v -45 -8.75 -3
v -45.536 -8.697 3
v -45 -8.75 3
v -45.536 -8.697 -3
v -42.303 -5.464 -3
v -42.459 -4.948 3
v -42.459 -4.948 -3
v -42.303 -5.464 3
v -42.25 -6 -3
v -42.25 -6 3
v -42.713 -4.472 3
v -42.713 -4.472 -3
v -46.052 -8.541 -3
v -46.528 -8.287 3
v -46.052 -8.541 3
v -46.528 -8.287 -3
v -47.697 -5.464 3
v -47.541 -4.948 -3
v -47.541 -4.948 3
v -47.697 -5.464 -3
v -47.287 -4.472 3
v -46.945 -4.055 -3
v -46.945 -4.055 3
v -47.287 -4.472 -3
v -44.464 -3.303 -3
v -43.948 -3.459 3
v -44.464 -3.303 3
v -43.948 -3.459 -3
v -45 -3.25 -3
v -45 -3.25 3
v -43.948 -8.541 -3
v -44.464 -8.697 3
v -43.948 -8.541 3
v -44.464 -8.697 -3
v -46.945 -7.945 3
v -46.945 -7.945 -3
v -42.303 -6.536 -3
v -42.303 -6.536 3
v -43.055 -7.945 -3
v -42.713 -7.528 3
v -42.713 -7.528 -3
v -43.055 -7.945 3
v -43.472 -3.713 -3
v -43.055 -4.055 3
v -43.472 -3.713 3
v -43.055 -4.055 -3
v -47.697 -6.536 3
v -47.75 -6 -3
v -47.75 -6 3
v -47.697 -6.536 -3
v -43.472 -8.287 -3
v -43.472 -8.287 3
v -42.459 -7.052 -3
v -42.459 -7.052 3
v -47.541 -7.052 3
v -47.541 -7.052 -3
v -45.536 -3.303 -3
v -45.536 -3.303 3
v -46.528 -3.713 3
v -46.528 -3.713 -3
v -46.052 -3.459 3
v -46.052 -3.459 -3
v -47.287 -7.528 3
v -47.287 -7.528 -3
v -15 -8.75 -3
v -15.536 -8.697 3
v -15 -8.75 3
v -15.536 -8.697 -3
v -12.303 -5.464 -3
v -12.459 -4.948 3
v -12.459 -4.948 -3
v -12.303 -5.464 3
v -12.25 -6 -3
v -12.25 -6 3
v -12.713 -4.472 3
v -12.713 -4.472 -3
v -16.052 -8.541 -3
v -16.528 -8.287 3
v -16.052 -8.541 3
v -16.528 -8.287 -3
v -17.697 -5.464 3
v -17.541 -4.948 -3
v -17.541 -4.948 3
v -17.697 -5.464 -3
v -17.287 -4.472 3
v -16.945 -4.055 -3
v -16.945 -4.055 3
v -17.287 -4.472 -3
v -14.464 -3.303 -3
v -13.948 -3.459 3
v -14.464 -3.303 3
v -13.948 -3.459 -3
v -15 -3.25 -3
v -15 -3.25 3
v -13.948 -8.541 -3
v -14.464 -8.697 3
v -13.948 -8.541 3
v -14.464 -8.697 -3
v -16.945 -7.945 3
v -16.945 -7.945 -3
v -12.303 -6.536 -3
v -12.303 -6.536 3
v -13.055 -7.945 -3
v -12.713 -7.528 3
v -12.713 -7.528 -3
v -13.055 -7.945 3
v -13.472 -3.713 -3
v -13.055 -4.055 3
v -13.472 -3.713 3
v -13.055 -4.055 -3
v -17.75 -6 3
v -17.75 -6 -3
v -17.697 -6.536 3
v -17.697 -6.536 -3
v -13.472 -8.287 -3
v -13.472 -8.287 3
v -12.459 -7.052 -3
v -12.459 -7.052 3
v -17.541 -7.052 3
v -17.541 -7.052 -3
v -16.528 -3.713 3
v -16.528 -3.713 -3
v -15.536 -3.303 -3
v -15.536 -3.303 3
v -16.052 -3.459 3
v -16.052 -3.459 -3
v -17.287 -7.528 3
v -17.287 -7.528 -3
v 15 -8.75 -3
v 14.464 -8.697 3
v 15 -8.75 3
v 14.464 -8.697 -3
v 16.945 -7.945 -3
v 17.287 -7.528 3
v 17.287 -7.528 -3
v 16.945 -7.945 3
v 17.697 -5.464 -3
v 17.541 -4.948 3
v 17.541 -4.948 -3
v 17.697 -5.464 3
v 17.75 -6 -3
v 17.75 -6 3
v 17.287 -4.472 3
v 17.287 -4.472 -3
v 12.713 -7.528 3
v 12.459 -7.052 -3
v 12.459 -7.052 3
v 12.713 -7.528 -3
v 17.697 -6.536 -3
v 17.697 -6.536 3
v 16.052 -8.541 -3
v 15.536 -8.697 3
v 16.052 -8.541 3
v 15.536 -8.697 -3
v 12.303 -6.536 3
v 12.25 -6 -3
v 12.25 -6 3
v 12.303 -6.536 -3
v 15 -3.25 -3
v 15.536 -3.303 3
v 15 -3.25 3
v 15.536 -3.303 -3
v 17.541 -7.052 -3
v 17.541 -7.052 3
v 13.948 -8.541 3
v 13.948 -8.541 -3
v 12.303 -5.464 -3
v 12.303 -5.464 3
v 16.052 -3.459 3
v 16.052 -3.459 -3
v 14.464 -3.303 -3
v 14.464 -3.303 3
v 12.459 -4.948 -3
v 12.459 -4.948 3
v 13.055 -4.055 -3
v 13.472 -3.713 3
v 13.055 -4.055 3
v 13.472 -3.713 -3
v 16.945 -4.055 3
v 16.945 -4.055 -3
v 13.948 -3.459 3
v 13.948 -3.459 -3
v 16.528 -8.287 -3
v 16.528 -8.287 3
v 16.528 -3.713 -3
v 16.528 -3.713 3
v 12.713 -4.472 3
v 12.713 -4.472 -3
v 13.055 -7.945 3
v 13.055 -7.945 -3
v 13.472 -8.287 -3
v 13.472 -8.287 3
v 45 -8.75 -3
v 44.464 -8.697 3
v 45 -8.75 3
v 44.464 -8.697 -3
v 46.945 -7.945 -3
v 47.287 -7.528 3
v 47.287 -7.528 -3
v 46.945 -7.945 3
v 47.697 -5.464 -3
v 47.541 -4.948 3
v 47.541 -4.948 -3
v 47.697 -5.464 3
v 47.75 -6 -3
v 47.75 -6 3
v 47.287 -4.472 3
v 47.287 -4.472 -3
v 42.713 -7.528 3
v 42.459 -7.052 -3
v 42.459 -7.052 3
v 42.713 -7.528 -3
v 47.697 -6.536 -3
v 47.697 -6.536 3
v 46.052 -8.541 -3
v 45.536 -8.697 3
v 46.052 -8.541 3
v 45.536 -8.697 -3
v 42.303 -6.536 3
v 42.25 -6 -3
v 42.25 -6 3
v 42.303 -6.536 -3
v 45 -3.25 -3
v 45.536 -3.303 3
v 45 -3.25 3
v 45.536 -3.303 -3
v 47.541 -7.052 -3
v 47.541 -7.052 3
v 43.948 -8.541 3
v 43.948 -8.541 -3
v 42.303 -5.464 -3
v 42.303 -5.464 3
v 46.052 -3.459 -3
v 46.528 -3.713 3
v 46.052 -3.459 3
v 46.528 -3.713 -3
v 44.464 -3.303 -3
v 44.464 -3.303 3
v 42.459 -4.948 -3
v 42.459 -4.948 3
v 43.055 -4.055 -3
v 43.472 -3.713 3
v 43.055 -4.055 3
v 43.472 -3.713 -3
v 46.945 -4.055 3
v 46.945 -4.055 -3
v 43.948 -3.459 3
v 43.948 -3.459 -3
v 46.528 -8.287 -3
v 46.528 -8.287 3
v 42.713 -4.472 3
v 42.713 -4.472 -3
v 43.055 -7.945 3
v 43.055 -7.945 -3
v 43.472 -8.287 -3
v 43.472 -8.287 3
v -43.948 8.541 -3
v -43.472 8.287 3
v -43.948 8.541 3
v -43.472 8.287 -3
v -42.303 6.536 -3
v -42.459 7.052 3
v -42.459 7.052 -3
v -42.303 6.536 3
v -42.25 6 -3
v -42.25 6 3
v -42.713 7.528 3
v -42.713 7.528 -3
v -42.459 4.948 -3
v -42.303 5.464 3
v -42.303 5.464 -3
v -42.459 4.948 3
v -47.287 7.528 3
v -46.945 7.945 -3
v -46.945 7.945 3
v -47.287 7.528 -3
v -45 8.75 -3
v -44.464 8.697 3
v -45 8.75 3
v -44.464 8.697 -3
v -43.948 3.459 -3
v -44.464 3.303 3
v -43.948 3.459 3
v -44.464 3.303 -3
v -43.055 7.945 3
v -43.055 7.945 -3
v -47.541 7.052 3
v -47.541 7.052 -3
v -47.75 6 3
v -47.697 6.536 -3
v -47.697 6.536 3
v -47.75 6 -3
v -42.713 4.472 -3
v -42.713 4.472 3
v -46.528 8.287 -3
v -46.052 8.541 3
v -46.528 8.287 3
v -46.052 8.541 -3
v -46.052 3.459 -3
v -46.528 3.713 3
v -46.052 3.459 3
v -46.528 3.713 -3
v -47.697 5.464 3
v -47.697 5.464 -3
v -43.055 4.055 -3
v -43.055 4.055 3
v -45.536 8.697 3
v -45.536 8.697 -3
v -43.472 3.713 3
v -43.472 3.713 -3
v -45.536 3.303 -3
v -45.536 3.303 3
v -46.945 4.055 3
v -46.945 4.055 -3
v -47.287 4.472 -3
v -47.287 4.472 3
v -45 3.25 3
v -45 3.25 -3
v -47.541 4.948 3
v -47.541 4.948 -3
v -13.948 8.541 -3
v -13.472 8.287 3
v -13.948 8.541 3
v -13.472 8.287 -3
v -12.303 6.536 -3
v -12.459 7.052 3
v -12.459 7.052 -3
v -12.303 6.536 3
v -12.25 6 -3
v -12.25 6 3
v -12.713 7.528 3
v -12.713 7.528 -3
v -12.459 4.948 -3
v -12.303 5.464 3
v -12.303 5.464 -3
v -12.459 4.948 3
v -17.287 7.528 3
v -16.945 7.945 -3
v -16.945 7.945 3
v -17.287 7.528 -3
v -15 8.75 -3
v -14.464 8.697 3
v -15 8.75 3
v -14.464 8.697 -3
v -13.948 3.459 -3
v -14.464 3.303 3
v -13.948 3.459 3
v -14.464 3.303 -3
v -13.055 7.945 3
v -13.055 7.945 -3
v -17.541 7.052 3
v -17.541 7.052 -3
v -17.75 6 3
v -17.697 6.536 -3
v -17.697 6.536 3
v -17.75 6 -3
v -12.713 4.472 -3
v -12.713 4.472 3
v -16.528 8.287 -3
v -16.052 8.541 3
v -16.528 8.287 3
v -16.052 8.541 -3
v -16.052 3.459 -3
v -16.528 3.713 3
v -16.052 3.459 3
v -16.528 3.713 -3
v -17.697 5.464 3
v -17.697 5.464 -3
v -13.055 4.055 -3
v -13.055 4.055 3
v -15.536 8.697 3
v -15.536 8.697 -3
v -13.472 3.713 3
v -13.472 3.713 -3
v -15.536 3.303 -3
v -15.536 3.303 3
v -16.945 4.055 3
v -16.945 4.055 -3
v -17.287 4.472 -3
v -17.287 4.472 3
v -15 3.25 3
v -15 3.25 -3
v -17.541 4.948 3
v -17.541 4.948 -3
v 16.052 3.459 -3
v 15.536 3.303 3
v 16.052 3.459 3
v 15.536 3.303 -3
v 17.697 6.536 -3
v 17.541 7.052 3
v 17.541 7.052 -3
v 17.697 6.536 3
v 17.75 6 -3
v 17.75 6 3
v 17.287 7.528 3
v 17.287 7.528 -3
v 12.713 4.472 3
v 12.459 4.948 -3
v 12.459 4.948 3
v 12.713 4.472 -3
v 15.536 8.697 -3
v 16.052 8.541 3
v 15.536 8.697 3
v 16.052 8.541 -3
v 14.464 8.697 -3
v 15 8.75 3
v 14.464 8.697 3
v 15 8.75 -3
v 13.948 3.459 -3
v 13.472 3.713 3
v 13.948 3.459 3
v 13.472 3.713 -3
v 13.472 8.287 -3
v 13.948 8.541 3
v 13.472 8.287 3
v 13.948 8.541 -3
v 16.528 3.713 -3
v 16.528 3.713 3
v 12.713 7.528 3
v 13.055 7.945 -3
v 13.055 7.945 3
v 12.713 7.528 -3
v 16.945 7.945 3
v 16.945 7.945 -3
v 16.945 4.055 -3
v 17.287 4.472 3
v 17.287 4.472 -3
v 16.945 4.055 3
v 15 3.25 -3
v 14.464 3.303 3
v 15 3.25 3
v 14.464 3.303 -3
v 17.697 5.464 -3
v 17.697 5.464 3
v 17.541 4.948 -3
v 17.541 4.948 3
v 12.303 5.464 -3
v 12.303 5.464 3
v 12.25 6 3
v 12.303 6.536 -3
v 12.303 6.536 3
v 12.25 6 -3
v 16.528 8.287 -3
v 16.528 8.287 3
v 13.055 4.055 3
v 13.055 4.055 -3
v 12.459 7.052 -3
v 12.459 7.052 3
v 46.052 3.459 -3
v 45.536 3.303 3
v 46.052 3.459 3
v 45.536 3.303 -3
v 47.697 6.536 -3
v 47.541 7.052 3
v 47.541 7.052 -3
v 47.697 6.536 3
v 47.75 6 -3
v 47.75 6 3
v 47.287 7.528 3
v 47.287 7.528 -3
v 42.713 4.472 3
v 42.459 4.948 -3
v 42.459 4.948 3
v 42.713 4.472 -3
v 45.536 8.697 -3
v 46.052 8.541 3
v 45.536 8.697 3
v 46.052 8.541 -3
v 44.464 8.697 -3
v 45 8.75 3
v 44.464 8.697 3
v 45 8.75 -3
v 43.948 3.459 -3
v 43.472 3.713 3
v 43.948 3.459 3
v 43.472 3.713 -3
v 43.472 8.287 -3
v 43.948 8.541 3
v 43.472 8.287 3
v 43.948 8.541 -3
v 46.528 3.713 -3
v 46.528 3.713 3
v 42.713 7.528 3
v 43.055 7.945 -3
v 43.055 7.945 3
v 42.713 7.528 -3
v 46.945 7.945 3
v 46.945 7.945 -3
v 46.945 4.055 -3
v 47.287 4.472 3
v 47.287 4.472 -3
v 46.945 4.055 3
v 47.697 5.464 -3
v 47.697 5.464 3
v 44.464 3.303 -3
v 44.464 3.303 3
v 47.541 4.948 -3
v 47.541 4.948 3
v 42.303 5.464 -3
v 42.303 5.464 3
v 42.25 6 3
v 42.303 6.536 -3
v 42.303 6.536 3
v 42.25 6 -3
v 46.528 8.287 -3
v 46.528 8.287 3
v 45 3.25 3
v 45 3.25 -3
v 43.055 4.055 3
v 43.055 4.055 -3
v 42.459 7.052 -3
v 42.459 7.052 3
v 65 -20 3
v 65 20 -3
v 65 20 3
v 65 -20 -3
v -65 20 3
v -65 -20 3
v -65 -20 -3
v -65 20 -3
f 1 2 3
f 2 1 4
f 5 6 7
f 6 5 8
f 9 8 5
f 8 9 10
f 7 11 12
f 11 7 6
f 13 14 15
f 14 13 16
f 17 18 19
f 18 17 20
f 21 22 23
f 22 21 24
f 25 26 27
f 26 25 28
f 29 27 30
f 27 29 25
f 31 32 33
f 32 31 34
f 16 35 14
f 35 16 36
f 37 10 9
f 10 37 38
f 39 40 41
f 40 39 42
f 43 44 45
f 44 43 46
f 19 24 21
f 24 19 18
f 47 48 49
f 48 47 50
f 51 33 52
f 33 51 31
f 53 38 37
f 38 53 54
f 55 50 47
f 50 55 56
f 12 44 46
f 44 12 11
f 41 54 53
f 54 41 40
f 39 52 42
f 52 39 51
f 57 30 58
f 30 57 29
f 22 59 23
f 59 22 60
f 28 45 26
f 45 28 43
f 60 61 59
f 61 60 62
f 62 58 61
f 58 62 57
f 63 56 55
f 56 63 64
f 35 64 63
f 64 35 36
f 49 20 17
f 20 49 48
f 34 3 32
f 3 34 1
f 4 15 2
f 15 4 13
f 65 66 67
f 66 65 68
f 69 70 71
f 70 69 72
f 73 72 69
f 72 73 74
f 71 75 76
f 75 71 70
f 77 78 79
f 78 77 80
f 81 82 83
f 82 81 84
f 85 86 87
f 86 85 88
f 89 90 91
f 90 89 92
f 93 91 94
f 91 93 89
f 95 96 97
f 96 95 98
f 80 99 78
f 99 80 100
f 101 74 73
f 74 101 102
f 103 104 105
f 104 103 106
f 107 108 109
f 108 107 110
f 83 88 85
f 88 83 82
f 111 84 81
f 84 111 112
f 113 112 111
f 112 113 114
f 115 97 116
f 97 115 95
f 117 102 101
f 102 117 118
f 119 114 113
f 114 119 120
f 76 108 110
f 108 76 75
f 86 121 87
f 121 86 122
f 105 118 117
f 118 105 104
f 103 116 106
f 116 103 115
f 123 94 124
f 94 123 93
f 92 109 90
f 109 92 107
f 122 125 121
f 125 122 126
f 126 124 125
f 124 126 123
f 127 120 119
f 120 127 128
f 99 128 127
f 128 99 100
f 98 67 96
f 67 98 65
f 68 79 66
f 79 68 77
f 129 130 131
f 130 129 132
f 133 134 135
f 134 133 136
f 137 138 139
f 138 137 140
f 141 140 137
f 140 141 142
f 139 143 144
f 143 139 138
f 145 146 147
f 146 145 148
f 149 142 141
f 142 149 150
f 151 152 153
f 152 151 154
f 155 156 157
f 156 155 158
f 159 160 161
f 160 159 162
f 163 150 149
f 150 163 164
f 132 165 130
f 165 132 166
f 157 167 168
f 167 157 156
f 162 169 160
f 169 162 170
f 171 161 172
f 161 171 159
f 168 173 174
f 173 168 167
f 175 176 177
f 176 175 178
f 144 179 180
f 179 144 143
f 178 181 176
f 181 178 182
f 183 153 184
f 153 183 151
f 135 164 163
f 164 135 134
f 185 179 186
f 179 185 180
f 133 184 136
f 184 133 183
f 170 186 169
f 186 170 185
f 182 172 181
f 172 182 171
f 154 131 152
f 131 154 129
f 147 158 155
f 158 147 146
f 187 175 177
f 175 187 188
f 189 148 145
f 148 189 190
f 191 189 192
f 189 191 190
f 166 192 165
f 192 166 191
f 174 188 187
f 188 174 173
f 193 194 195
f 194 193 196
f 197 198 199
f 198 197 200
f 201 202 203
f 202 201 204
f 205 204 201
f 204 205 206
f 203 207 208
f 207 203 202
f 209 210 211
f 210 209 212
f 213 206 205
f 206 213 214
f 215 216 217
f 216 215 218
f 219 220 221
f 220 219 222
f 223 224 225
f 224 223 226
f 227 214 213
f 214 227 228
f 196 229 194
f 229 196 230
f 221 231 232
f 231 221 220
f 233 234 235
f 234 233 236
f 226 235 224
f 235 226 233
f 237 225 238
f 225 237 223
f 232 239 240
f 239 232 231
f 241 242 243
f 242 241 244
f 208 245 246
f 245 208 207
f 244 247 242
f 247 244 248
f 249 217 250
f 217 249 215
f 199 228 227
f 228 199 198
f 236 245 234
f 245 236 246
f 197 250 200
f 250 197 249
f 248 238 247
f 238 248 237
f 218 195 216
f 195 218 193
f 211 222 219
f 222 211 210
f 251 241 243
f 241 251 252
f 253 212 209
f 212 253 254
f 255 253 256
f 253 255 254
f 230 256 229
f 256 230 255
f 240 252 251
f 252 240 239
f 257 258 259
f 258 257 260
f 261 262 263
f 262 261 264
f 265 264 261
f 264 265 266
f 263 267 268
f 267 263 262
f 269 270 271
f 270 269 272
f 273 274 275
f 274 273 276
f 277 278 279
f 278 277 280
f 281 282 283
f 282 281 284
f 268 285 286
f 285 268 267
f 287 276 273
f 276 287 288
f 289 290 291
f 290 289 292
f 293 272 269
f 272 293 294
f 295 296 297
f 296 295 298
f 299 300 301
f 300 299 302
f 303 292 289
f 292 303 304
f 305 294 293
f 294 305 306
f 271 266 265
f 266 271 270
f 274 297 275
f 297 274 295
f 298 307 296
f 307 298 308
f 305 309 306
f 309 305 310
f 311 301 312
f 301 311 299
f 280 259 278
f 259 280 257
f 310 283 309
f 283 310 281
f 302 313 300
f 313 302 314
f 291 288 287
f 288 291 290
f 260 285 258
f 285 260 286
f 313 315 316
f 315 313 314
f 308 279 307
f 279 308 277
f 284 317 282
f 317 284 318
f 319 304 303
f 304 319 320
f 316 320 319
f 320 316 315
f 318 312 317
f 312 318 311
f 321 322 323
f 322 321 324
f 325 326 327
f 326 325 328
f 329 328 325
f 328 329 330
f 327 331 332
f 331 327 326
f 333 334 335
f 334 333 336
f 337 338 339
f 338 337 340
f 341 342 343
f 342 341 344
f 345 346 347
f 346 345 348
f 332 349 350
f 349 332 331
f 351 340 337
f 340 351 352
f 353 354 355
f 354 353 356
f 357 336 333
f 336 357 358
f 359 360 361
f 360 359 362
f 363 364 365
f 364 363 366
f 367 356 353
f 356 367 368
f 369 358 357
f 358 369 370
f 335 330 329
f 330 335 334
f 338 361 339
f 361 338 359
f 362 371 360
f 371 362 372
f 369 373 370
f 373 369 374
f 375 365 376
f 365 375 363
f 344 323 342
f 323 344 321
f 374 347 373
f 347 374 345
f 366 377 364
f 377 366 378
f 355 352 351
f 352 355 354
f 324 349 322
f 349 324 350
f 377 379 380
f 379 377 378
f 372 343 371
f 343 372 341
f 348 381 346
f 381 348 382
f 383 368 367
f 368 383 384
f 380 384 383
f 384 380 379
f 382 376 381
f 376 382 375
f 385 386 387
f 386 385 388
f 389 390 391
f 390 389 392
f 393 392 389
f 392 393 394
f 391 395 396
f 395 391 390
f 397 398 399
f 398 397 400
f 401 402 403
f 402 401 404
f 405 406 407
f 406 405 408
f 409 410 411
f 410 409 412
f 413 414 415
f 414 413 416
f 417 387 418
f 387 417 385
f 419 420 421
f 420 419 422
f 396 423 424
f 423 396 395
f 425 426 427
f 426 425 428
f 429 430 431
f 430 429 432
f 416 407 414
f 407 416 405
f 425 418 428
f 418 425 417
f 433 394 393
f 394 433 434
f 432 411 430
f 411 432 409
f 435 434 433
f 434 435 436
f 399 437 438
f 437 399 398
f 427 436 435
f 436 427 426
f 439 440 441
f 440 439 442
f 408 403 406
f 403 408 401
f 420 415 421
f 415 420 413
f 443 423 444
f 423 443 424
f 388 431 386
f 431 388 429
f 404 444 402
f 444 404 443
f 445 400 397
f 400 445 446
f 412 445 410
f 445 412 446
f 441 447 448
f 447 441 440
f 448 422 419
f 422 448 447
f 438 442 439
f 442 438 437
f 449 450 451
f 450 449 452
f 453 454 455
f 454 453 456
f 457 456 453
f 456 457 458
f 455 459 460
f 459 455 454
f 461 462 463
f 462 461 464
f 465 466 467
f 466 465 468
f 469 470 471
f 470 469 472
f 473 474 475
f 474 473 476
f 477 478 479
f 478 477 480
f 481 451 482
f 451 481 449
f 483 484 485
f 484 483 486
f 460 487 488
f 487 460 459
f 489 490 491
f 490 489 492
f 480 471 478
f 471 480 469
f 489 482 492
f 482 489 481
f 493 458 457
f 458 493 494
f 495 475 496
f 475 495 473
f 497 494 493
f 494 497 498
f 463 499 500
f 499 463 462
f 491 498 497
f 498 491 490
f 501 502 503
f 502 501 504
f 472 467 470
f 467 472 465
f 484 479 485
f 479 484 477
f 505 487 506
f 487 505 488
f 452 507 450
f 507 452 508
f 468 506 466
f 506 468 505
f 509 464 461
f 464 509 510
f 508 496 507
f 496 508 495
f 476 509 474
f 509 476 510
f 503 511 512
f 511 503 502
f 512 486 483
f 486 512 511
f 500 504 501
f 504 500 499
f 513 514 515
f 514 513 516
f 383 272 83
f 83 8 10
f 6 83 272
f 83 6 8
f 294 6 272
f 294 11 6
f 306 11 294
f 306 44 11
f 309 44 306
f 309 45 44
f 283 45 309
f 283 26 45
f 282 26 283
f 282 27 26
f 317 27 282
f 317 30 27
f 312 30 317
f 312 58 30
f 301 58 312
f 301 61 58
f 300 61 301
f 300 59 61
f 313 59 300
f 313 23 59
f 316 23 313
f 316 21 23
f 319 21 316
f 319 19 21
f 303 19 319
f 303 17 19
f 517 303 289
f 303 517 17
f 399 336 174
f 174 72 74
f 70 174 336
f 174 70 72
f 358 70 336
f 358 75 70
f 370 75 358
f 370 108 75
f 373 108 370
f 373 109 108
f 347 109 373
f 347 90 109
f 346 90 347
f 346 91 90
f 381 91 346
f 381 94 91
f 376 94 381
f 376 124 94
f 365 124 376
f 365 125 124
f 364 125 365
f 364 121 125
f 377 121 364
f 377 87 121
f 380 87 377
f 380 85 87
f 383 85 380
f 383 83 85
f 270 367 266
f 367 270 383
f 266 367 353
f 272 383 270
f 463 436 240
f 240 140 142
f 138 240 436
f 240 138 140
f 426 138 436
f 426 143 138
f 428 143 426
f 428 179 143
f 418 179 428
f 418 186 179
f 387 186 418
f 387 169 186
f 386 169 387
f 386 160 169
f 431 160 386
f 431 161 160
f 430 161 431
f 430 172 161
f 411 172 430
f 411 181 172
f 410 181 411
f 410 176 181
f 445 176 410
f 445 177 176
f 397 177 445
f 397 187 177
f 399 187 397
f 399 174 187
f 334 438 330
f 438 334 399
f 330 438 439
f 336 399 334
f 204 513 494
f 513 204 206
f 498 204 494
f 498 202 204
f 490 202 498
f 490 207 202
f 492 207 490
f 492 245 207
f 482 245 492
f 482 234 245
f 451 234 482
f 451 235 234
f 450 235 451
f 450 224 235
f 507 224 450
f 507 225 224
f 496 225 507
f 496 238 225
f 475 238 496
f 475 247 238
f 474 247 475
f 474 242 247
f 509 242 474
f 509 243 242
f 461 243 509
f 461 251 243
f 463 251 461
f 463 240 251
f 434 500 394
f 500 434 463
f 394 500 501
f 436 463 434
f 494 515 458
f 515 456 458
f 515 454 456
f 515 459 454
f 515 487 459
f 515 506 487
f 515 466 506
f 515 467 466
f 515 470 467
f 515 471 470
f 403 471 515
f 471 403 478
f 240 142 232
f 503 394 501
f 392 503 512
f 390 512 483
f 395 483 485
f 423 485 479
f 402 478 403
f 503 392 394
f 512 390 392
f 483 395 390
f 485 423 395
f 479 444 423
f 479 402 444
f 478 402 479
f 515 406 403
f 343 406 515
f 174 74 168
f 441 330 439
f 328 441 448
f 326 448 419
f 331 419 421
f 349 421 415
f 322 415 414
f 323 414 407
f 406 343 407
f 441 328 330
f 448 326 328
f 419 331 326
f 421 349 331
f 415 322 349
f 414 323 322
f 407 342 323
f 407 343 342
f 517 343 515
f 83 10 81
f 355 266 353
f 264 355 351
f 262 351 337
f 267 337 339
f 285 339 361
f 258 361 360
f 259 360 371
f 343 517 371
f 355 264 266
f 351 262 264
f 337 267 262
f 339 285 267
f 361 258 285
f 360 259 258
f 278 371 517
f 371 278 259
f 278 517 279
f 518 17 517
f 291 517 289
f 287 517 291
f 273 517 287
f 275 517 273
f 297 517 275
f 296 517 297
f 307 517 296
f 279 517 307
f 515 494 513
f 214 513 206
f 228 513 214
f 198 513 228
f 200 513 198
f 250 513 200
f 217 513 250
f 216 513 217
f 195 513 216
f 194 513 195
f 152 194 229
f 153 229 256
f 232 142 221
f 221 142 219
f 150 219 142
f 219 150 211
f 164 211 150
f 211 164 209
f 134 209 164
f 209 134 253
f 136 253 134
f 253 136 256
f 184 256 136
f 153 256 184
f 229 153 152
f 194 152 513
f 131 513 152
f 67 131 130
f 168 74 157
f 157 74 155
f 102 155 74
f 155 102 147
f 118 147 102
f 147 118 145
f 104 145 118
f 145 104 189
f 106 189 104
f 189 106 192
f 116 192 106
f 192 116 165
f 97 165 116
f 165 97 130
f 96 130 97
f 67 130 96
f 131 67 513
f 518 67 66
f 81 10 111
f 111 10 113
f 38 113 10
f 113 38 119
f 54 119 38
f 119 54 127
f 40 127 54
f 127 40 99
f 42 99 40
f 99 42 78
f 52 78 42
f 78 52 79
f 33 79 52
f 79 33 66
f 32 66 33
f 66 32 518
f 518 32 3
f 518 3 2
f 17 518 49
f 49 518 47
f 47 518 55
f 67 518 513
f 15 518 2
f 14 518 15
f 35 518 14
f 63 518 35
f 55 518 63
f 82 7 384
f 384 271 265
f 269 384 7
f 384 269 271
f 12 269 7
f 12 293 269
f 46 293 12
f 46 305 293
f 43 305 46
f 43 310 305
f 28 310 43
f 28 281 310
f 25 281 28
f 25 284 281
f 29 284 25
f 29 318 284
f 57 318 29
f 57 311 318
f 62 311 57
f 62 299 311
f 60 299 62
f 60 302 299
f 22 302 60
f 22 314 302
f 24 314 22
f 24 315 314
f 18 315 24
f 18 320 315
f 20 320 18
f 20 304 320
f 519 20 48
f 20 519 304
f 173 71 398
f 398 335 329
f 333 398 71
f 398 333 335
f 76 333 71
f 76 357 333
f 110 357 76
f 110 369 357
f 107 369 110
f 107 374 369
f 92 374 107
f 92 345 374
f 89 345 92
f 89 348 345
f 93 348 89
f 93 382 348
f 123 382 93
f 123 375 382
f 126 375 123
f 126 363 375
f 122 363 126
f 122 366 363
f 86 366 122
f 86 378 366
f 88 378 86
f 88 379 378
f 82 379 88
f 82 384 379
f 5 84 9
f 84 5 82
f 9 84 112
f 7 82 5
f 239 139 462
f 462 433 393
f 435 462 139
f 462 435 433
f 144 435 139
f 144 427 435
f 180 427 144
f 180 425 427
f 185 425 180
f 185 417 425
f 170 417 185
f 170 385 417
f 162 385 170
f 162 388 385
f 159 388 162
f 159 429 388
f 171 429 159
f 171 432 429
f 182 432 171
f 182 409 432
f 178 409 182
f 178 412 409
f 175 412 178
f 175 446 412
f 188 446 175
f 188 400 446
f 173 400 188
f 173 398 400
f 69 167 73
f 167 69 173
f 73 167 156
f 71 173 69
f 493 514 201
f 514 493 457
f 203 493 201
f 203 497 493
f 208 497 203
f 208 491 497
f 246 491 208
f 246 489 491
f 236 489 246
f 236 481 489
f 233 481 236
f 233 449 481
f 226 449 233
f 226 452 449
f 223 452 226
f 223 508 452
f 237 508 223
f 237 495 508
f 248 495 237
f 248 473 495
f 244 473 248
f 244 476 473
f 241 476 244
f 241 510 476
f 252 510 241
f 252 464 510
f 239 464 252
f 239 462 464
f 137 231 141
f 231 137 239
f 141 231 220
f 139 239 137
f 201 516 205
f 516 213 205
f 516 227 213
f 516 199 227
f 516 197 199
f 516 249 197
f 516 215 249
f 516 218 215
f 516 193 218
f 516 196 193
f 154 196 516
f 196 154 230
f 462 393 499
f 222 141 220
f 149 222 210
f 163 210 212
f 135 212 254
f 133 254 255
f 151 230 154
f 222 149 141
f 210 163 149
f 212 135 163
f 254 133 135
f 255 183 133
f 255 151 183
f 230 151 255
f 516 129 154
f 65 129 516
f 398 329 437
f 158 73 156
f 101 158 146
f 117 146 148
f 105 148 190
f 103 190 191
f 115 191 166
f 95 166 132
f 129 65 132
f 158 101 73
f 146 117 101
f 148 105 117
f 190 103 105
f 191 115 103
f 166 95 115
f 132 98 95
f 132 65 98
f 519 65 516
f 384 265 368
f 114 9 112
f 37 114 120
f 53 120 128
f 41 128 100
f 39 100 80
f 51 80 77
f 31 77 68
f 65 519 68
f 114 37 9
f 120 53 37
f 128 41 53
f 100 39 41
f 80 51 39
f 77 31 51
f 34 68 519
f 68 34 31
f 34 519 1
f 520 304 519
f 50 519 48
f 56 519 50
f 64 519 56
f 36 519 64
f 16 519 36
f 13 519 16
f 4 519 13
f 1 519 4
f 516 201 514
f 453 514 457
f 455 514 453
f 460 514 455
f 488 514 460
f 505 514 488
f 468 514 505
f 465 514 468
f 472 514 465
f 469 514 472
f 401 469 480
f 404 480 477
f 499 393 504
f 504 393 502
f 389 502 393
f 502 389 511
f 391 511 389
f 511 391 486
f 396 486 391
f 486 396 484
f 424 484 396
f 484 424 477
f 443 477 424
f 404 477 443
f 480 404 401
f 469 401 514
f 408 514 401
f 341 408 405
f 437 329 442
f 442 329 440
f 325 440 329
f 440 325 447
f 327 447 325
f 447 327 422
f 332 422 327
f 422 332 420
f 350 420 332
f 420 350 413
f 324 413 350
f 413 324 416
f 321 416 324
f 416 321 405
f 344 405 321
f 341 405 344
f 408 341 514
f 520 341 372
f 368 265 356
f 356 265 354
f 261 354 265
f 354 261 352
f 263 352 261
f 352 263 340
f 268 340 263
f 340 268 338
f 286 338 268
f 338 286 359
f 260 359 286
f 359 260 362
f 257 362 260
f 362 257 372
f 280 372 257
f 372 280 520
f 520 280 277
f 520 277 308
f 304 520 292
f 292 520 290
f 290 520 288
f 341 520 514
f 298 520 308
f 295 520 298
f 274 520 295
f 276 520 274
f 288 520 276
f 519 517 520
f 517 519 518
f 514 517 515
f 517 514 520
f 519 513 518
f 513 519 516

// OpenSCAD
$fn = 32;

// ----------------------------------------------------------------------
// Hole bar, 4 x Ø5.5
// tworows layout, 20 mm edge offset
// ----------------------------------------------------------------------

// --- parameters (mm) ---
bar_w = 40;       // bar width (Y)
bar_t = 6;        // bar thickness (Z)
holes = 4;        // holes per row
hole_d = 5.5;     // hole diameter
edge = 20;        // offset from the bar end to the first hole
pitch = 30;       // pitch between neighbouring holes
row_offset = 12;  // distance between the two rows

// --- derived feature positions (mm) ---
span = (holes - 1) * pitch;   // = 90   distance between the end holes
bar_l = span + 2 * edge;      // = 130   overall bar length
start_x = -bar_l / 2 + edge;  // = -45   X of the first hole
feature_centers = [
  [start_x + 0 * pitch, -row_offset / 2],
  [start_x + 1 * pitch, -row_offset / 2],
  [start_x + 2 * pitch, -row_offset / 2],
  [start_x + 3 * pitch, -row_offset / 2]
];   // hole centres of the first row
row2_centers = [
  [start_x + 0 * pitch, row_offset / 2],
  [start_x + 1 * pitch, row_offset / 2],
  [start_x + 2 * pitch, row_offset / 2],
  [start_x + 3 * pitch, row_offset / 2]
];   // hole centres of the second row

// bar with two rows of holes, both read from their own centre arrays
difference() {
  translate([-bar_l / 2, -bar_w / 2, -bar_t / 2]) cube([bar_l, bar_w, bar_t]);
  for (centre = feature_centers)
    translate([centre[0], centre[1], 0])
      cylinder(d = hole_d, h = bar_t + 2, center = true);
  for (centre = row2_centers)
    translate([centre[0], centre[1], 0])
      cylinder(d = hole_d, h = bar_t + 2, center = true);
}
